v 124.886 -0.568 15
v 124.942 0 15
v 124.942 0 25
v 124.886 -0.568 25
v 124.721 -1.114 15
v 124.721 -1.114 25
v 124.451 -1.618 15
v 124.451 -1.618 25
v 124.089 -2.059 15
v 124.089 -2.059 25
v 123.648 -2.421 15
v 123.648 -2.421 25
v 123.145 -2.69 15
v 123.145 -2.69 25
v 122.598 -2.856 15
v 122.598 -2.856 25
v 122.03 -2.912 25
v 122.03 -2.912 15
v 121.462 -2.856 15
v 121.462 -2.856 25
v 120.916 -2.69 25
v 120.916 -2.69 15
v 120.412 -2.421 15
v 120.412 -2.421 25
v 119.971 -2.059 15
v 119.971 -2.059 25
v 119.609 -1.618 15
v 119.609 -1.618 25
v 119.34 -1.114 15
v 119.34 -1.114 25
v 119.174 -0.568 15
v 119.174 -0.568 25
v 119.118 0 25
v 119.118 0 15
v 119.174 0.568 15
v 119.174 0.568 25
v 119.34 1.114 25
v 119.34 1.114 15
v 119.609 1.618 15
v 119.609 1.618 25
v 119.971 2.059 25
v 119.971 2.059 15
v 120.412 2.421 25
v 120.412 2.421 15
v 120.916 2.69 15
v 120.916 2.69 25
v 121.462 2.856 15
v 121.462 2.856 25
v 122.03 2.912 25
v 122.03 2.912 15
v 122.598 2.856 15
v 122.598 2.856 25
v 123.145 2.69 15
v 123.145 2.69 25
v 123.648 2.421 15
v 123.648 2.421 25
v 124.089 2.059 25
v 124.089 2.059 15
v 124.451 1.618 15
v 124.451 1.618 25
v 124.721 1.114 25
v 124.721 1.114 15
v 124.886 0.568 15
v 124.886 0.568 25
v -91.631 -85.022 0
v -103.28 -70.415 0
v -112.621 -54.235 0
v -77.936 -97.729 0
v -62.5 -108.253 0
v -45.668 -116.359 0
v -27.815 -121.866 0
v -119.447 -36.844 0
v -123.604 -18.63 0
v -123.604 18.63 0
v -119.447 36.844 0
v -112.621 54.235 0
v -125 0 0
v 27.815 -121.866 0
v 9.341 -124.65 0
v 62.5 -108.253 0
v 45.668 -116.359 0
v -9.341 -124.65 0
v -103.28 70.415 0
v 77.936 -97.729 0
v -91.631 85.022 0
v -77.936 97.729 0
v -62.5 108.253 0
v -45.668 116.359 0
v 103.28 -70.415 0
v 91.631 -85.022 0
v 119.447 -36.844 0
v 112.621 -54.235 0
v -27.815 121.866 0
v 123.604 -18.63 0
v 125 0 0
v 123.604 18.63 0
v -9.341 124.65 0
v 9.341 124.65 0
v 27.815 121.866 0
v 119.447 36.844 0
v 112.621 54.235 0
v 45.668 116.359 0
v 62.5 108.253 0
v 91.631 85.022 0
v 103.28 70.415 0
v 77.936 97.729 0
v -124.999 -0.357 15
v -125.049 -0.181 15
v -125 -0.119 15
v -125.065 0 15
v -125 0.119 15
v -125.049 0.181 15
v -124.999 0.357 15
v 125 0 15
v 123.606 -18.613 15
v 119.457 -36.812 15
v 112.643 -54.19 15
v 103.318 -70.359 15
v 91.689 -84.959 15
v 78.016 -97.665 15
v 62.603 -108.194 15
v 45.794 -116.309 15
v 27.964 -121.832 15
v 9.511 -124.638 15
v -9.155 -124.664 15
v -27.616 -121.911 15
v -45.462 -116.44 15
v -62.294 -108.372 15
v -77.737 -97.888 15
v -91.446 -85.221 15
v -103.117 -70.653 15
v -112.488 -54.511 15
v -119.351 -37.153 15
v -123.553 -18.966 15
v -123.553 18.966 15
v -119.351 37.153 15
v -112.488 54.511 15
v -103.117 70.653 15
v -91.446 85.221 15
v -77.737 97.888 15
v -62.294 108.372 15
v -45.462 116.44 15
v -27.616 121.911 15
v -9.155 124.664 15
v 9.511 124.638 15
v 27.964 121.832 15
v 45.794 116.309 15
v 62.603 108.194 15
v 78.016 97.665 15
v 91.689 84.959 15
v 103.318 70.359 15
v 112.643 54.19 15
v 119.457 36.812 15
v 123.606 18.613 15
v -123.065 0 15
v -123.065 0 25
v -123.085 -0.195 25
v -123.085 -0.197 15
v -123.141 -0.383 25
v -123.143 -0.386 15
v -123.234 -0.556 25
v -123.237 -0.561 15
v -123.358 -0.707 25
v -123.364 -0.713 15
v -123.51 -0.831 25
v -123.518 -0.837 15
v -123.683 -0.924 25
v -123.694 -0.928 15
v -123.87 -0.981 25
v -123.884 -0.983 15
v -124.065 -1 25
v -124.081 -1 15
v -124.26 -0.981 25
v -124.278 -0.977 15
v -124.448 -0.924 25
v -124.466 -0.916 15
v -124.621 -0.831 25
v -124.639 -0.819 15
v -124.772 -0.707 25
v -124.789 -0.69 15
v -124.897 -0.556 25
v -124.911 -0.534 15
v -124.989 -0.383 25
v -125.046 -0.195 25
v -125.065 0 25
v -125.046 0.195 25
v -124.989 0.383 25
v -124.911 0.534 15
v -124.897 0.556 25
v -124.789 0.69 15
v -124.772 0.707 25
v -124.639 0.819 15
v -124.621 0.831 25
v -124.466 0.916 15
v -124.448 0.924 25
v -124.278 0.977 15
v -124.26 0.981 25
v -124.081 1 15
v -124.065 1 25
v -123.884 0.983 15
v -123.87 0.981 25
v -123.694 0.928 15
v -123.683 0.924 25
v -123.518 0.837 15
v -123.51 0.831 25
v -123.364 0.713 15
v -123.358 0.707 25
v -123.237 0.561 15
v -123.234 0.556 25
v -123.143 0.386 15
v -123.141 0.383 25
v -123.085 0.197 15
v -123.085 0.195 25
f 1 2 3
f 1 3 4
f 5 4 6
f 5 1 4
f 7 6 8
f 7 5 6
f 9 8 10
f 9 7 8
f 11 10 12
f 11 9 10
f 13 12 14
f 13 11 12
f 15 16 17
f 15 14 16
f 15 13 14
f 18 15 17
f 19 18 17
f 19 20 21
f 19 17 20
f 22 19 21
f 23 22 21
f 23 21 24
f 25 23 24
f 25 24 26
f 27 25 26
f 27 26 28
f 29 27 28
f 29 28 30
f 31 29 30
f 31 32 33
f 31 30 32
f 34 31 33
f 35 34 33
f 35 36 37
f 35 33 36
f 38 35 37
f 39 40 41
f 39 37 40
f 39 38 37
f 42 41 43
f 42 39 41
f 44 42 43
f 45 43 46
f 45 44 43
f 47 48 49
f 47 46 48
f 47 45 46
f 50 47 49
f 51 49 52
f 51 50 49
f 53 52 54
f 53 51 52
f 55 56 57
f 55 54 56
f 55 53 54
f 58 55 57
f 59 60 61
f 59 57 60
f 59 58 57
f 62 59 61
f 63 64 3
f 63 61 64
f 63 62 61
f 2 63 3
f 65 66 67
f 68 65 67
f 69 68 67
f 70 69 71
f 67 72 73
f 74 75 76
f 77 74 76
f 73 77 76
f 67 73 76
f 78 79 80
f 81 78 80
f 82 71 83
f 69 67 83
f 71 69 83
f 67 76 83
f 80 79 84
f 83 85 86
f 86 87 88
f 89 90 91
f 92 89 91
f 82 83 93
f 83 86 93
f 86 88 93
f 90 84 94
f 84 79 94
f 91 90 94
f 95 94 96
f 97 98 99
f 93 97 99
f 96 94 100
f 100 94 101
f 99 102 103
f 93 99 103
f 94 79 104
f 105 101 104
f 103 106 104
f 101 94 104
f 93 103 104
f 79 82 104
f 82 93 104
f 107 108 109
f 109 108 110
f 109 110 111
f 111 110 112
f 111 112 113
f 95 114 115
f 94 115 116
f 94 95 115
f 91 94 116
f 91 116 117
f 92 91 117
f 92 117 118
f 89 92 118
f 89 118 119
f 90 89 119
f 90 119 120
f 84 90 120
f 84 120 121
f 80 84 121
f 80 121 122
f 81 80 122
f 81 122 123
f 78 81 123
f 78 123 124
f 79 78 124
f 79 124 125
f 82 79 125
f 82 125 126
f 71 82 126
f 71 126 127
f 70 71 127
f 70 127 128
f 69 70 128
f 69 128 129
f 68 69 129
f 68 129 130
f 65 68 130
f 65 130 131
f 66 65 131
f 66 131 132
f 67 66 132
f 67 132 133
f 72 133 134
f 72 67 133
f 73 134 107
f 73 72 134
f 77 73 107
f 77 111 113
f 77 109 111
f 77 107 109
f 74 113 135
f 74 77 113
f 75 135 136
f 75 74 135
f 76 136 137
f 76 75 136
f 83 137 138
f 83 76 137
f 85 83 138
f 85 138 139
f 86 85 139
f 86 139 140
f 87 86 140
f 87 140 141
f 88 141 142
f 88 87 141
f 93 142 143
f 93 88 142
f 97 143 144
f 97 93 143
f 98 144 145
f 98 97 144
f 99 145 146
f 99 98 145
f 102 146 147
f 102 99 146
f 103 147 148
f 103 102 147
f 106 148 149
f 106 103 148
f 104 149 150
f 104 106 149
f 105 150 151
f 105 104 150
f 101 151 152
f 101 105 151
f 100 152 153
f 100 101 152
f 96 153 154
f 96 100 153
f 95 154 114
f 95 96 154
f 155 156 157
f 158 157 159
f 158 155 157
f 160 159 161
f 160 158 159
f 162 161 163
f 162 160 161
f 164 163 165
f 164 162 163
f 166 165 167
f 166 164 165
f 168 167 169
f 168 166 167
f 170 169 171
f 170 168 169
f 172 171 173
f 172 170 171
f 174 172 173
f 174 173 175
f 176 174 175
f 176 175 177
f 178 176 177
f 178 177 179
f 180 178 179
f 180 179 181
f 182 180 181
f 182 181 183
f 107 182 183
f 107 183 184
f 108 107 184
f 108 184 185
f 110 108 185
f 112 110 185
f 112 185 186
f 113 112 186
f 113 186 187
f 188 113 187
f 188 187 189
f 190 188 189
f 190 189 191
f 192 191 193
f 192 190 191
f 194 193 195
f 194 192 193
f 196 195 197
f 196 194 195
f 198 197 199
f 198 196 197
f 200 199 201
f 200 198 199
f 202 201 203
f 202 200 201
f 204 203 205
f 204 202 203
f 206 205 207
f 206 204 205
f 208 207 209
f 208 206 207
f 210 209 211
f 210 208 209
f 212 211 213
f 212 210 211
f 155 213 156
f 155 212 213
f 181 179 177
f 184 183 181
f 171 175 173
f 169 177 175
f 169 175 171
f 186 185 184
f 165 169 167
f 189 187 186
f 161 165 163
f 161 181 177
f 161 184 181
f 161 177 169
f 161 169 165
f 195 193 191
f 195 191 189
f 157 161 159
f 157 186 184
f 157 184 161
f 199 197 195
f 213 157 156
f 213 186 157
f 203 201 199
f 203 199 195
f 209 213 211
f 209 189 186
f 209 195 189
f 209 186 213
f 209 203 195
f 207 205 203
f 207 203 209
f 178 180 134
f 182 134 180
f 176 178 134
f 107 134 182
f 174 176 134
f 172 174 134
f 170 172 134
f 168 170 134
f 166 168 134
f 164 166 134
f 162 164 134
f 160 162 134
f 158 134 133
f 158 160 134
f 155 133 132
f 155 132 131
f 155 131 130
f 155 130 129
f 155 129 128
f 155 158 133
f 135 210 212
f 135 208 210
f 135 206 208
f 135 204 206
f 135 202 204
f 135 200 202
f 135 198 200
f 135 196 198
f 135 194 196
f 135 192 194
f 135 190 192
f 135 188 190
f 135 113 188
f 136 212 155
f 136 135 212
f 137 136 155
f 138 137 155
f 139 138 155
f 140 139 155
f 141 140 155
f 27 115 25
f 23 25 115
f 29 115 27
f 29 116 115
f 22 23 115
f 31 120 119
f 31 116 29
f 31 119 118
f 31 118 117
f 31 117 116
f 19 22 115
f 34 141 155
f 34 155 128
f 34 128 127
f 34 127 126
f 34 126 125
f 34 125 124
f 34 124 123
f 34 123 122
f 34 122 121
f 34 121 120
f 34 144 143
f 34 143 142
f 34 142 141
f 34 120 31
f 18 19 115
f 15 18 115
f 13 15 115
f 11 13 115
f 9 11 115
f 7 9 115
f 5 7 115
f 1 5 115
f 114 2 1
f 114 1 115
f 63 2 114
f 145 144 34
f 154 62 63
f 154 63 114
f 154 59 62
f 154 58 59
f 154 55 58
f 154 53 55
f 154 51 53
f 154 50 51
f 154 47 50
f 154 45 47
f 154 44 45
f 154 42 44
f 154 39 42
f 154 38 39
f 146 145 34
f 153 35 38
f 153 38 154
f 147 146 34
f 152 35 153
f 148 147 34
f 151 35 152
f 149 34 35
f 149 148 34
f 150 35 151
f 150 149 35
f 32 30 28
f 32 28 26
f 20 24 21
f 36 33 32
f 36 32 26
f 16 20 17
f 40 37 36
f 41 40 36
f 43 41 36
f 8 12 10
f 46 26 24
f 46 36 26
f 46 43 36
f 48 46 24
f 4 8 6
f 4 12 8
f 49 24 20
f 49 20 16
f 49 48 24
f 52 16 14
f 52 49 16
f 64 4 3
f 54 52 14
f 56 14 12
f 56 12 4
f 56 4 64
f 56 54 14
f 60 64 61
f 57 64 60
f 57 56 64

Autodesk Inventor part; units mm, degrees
ref_plane "YZ Plane" through (0, 0, 0) normal (1, 0, 0) x (0, 1, 0)
ref_plane "XZ Plane" through (0, 0, 0) normal (0, 1, 0) x (-1, 0, 0)
ref_plane "XY Plane" through (0, 0, 0) normal (0, 0, 1) x (1, 0, 0)
sketch "Sketch1" plane through (0, 0, 0) normal (0, 0, 1) x (1, 0, 0)
  circle A0 centre (0, 0) radius 125
  dimension "d0" = 250
extrude "Extrusion1" add sketch "Sketch1" along normal blind 15
sketch "Sketch2" plane through (0, 0, 15) normal (0, 0, 1) x (1, 0, 0)
  circle A0 centre (-124.0653, 0) radius 1
  point P0 (0, 0)
  dimension "d3" = 2
extrude "Extrusion2" add sketch "Sketch2" along normal blind 10
sketch "Sketch3" plane through (0, 0, 15) normal (0, 0, 1) x (1, 0, 0)
  circle A0 centre (122.0302, 0) radius 2.912
  point P0 (0, 0)
extrude "Extrusion3" add sketch "Sketch3" along normal blind 10
properties material "Steel"
